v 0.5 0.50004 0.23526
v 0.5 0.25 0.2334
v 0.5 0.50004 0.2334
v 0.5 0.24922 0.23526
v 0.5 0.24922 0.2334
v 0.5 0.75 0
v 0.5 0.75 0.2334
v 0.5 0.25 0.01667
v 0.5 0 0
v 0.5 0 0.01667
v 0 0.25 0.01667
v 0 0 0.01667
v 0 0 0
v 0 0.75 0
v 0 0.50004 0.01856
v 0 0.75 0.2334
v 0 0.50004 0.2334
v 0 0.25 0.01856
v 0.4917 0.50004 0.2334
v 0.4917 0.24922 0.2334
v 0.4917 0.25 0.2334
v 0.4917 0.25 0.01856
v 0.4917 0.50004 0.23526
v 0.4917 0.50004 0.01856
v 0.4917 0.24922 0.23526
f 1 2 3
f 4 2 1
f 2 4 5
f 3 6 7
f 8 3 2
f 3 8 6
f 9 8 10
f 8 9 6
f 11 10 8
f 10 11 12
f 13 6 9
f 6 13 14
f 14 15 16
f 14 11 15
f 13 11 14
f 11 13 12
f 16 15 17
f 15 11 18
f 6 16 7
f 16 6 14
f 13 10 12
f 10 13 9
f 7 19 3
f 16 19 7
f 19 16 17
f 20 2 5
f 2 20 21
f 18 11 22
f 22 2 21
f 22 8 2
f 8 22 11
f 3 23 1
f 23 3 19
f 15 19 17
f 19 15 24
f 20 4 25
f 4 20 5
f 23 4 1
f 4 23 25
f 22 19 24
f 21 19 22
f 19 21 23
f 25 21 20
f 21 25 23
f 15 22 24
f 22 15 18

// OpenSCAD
// Parameters
base_length = 0.5;
base_width = 0.75;
base_height = 0.016667;

block1_length = 0.5;
block1_width = 0.5;
block1_offset_front = 0.25;          // Y distance from front edge
block1_reach = 0.2334;               // Z top from base datum
block1_height = block1_reach - base_height;

strip_width = 0.0083;                // X dimension
strip_length = 0.5;                  // Y dimension
strip_height = 0.0083;
strip_offset_front = 0.25;           // Y position
right_strip_x = base_length - strip_width; // flush right

upper_pad_depth = 0.1;
upper_pad_length = 0.5;
upper_pad_width = 0.250819;
upper_pad_offset_front = 0.24922;    // Y position
upper_pad_z = block1_reach;          // bottom sits on top of block1

transverse_thickness = 0.0021;
transverse_reach = 0.335265;         // top from base datum
transverse_z_bottom = transverse_reach - transverse_thickness;
transverse_length = 0.5;
transverse_width = upper_pad_width;  // same footprint as upper pad
transverse_y = upper_pad_offset_front;

// Void (stepped pocket) dimensions
shallow_pocket_depth = 0.1;
shallow_pocket_z = transverse_reach - shallow_pocket_depth; // bottom of shallow pocket
deep_pocket_depth = 0.2167;
deep_pocket_width = right_strip_x;   // from left edge (0) to inner edge of right strip
deep_pocket_z = shallow_pocket_z - deep_pocket_depth;

$fn = 50; // resolution for any curves (none here)

// Main solid union
module solids() {
    // Base slab
    cube([base_length, base_width, base_height]);
    
    // Upper rectangular feature (block1)
    translate([0, block1_offset_front, base_height])
        cube([block1_length, block1_width, block1_height]);
    
    // Left narrow strip
    translate([0, strip_offset_front, base_height])
        cube([strip_width, strip_length, strip_height]);
    
    // Right narrow strip
    translate([right_strip_x, strip_offset_front, base_height])
        cube([strip_width, strip_length, strip_height]);
    
    // Upper pad (stepped shallow solid)
    translate([0, upper_pad_offset_front, upper_pad_z])
        cube([upper_pad_length, upper_pad_width, upper_pad_depth]);
    
    // Thin transverse feature
    translate([0, transverse_y, transverse_z_bottom])
        cube([transverse_length, transverse_width, transverse_thickness]);
}

// Void solid (to be subtracted)
module void() {
    // Shallow pocket
    translate([0, upper_pad_offset_front, shallow_pocket_z])
        cube([upper_pad_length, upper_pad_width, shallow_pocket_depth]);
    
    // Deep pocket (narrower, shares left, front, back edges)
    translate([0, upper_pad_offset_front, deep_pocket_z])
        cube([deep_pocket_width, upper_pad_width, deep_pocket_depth]);
}

// Final model
difference() {
    solids();
    void();
}
